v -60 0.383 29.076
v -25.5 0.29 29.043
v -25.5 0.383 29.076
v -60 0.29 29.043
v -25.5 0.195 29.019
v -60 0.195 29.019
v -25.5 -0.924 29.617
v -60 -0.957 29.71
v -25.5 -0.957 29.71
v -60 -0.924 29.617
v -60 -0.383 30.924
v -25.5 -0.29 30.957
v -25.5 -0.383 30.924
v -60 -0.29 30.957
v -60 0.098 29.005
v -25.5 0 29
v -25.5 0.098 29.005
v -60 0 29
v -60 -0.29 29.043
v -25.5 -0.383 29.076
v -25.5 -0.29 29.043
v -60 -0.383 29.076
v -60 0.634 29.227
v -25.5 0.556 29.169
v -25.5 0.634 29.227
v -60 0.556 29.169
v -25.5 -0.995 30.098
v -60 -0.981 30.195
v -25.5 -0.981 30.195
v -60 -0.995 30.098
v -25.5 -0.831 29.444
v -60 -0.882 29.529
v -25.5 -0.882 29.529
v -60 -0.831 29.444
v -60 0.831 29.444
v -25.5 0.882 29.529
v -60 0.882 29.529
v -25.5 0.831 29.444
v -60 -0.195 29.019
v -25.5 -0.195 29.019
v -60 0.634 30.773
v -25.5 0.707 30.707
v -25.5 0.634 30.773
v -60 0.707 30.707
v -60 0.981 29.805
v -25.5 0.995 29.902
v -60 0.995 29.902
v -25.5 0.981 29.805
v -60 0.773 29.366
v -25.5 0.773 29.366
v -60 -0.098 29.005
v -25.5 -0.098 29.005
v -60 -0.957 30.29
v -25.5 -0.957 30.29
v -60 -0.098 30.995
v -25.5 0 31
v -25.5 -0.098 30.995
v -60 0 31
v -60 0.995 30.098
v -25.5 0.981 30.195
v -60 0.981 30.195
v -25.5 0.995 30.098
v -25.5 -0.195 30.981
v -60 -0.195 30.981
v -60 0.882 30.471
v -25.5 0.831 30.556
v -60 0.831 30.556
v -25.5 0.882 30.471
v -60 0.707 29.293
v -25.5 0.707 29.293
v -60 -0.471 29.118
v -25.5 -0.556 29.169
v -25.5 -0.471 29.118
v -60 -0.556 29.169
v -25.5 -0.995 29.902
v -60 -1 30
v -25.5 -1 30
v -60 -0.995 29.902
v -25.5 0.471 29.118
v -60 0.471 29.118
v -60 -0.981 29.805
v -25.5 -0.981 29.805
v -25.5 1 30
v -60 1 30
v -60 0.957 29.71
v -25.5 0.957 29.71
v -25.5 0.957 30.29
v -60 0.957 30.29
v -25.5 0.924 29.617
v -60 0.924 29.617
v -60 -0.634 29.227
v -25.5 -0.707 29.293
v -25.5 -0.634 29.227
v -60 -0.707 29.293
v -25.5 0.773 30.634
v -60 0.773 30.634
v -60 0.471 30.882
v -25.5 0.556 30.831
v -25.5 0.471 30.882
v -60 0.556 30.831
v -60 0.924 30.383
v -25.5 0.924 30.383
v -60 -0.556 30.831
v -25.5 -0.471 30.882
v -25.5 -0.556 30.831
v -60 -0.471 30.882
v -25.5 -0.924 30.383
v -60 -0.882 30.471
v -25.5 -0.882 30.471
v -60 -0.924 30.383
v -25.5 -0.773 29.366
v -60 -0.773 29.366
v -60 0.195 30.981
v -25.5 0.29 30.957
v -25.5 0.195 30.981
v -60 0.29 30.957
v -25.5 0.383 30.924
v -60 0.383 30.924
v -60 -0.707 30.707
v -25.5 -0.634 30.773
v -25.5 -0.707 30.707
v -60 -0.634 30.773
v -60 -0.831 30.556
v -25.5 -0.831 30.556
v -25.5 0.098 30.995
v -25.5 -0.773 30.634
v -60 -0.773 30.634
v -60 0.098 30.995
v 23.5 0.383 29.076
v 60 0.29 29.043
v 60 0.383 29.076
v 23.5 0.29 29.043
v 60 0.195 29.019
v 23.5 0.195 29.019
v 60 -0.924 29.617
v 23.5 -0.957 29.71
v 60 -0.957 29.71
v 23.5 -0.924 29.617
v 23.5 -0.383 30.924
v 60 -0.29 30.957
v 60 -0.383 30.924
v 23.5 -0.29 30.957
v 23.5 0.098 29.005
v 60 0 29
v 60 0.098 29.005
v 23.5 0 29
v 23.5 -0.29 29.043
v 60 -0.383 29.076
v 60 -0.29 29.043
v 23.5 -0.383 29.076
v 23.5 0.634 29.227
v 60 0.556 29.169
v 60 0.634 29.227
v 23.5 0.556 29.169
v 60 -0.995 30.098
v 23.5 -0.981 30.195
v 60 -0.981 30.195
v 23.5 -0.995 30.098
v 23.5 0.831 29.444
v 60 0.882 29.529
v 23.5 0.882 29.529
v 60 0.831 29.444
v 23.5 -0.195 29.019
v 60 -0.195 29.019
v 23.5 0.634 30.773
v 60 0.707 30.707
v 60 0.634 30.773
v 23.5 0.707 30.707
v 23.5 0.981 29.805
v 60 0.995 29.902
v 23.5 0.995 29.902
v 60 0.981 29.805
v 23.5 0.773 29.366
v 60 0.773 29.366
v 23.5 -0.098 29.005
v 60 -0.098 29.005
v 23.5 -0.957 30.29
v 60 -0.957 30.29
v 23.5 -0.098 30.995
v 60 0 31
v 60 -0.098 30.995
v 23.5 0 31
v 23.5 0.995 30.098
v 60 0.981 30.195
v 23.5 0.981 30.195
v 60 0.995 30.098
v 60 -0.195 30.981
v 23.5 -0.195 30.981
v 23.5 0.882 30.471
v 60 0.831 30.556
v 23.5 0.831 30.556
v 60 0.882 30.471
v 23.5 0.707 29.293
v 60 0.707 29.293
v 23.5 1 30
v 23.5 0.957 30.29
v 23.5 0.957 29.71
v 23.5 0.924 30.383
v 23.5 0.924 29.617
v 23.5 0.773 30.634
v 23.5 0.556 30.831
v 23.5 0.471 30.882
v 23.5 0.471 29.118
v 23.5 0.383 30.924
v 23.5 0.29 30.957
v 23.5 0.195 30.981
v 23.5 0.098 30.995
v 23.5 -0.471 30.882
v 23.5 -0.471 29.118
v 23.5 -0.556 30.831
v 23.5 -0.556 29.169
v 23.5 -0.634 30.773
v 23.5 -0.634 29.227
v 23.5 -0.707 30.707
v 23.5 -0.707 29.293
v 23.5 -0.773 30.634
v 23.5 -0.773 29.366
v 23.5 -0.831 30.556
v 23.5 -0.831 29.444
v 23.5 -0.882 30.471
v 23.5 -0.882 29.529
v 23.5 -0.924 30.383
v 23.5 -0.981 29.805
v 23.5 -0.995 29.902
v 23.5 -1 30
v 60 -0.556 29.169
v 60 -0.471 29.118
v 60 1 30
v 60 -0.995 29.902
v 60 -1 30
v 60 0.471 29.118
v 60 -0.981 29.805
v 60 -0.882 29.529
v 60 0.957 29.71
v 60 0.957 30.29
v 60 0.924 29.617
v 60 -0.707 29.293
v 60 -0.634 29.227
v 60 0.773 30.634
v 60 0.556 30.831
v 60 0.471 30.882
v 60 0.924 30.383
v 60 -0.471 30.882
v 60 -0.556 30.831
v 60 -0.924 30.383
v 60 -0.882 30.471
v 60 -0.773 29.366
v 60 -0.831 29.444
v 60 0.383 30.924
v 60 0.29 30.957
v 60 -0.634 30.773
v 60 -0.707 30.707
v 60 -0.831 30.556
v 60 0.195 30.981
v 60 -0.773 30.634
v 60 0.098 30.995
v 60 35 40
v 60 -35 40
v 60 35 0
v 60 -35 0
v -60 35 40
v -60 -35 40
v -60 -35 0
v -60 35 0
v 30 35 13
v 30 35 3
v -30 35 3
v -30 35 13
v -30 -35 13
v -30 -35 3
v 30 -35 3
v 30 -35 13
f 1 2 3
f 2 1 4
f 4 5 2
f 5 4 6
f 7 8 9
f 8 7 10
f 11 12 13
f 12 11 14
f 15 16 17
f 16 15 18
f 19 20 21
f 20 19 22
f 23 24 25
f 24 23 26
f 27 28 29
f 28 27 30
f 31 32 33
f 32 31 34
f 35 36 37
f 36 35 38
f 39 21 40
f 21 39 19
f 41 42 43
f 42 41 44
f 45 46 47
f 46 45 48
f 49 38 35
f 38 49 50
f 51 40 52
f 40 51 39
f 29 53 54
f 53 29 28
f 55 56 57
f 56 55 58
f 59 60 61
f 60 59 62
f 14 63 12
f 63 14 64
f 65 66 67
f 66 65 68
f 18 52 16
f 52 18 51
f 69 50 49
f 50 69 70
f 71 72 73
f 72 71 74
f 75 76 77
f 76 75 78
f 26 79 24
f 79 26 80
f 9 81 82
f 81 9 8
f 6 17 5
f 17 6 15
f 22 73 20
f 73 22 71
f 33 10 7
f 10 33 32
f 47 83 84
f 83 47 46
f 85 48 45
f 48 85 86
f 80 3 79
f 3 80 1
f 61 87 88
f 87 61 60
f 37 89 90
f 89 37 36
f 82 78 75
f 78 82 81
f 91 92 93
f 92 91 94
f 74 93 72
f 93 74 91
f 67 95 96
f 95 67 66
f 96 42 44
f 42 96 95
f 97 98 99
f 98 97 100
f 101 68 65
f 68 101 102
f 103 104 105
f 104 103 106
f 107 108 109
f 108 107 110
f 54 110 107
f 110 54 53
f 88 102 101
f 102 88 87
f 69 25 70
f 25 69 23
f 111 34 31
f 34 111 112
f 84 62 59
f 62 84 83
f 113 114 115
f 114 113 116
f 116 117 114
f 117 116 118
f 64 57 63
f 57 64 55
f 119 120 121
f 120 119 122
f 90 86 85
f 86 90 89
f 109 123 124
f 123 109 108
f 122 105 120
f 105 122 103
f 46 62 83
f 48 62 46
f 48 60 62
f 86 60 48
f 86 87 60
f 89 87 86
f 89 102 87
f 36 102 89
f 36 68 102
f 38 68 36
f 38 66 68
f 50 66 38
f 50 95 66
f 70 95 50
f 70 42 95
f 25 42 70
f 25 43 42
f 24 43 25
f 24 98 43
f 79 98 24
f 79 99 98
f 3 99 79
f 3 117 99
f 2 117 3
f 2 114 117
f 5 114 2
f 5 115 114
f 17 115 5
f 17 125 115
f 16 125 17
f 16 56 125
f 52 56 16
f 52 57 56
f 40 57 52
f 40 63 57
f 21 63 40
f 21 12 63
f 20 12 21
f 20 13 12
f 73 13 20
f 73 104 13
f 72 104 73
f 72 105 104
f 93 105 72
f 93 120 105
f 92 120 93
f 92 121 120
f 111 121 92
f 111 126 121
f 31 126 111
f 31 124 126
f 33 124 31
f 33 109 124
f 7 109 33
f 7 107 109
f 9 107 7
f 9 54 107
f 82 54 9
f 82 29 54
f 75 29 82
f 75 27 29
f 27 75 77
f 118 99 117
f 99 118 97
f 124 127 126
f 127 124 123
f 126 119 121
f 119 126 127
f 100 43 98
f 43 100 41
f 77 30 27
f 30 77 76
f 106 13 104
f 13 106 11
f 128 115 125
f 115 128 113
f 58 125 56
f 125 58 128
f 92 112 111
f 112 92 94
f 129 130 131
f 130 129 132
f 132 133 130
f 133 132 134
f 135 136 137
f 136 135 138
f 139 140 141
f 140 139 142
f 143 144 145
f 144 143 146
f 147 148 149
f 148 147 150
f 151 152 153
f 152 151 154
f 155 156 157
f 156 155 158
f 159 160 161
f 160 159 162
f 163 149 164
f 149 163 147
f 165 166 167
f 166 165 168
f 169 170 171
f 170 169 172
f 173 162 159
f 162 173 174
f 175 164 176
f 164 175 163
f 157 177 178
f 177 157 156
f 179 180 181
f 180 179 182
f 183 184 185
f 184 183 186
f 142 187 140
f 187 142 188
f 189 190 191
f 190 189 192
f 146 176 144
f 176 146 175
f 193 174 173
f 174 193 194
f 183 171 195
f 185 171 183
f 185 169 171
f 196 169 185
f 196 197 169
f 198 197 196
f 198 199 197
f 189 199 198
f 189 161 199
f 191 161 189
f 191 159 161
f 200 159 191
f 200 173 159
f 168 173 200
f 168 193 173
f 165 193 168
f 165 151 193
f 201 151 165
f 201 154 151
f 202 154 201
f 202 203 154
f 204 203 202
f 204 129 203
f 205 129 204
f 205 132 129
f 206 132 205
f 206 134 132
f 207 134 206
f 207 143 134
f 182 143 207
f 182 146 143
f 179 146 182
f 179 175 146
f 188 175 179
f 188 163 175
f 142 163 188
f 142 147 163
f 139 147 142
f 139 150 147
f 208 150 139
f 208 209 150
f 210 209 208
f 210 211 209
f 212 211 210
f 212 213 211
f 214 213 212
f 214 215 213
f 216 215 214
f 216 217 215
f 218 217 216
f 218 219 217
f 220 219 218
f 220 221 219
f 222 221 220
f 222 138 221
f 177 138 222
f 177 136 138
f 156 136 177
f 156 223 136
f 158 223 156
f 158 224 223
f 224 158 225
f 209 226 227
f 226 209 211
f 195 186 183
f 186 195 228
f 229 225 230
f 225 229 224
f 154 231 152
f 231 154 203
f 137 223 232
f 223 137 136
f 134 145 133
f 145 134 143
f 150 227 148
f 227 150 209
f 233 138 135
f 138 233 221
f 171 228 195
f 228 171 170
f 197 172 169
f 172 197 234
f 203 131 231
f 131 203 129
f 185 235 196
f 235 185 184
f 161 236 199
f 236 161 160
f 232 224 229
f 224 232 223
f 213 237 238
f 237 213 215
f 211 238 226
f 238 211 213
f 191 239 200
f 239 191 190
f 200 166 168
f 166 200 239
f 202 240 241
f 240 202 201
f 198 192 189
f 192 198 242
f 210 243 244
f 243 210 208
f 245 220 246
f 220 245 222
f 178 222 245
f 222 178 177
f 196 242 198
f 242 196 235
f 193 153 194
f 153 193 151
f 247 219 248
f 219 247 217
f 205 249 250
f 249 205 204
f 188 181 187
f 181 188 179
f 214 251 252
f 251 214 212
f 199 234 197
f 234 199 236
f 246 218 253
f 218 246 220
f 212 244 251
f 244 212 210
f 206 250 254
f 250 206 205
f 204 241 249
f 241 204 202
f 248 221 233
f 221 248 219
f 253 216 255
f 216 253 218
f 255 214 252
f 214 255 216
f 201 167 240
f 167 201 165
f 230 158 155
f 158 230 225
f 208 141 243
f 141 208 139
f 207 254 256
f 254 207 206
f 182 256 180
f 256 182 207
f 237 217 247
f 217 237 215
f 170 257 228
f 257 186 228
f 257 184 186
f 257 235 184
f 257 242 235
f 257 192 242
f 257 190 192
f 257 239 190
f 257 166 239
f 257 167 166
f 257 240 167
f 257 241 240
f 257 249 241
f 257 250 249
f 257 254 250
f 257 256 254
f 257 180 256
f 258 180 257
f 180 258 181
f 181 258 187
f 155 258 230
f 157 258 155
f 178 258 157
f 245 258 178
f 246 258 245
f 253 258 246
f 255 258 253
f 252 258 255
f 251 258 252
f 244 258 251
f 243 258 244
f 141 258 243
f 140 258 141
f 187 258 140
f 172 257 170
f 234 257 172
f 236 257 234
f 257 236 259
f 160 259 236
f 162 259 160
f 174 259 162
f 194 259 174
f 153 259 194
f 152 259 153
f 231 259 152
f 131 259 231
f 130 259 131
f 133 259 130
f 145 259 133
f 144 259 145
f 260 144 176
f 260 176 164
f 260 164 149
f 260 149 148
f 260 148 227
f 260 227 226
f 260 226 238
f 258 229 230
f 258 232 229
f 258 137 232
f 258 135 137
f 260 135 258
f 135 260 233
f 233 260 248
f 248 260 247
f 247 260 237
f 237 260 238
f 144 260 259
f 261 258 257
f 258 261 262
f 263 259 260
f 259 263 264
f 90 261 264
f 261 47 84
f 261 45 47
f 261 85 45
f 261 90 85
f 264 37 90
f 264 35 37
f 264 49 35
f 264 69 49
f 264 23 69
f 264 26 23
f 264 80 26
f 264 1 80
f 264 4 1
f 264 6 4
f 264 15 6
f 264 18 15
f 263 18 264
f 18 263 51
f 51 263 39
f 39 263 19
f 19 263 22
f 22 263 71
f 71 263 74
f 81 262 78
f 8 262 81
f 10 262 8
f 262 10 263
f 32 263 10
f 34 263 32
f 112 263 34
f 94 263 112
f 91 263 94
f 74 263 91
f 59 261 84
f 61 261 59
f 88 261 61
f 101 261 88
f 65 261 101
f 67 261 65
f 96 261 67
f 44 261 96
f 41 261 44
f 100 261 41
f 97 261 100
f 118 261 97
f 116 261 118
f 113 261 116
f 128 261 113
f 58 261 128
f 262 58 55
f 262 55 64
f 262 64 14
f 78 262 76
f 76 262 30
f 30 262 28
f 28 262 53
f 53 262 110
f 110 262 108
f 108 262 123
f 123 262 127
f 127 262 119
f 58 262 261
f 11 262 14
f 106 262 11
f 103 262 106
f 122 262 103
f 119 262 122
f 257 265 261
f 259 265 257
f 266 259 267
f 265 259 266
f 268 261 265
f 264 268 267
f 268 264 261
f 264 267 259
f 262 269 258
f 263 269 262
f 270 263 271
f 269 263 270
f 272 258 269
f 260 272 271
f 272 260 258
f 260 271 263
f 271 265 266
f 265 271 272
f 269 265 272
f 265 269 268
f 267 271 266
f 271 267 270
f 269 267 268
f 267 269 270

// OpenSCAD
// Mini horizontal gel-electrophoresis buffer tank
// Print orientation: base on XY plane, open top at z = 40

// ---- Tank dimensions ----
outer_x = 120;   // outer length along X
outer_y = 70;    // outer width along Y
height  = 40;    // overall height along Z
wall    = 3;     // wall thickness
floor   = 3;     // floor thickness

// ---- Platform dimensions ----
platform_len   = 60;   // platform length along X
platform_top_z = 13;   // platform top height (10 mm above inner floor)

// ---- Electrode holes ----
hole_d = 2;     // hole diameter
hole_y = 0;     // hole Y position
hole_z = 30;    // hole Z position

// ---- Modelling helpers ----
eps = 0.5;       // cutter overshoot past faces
$fn = 64;        // curve resolution

// ---- Derived ----
inner_h = height - floor;              // inner floor to open top
platform_h = platform_top_z - floor;   // platform height above floor

difference() {
    // Main tank body
    translate([-outer_x/2, -outer_y/2, 0])
        cube([outer_x, outer_y, height]);

    // Raised platform in the middle (spans full inner width)
    translate([-outer_x/2 + (outer_x - platform_len)/2,
               -outer_y/2,
               floor])
        cube([platform_len, outer_y, platform_h]);

    // Horizontal electrode holes through each end wall along X
    for (sx = [-1, 1])
        translate([sx > 0 ? outer_x/2 - 1 : -outer_x/2 - 1,
                   hole_y,
                   hole_z])
            rotate([0, 90, 0])
                cylinder(d = hole_d, h = outer_y + 2*eps, center = true);
}
